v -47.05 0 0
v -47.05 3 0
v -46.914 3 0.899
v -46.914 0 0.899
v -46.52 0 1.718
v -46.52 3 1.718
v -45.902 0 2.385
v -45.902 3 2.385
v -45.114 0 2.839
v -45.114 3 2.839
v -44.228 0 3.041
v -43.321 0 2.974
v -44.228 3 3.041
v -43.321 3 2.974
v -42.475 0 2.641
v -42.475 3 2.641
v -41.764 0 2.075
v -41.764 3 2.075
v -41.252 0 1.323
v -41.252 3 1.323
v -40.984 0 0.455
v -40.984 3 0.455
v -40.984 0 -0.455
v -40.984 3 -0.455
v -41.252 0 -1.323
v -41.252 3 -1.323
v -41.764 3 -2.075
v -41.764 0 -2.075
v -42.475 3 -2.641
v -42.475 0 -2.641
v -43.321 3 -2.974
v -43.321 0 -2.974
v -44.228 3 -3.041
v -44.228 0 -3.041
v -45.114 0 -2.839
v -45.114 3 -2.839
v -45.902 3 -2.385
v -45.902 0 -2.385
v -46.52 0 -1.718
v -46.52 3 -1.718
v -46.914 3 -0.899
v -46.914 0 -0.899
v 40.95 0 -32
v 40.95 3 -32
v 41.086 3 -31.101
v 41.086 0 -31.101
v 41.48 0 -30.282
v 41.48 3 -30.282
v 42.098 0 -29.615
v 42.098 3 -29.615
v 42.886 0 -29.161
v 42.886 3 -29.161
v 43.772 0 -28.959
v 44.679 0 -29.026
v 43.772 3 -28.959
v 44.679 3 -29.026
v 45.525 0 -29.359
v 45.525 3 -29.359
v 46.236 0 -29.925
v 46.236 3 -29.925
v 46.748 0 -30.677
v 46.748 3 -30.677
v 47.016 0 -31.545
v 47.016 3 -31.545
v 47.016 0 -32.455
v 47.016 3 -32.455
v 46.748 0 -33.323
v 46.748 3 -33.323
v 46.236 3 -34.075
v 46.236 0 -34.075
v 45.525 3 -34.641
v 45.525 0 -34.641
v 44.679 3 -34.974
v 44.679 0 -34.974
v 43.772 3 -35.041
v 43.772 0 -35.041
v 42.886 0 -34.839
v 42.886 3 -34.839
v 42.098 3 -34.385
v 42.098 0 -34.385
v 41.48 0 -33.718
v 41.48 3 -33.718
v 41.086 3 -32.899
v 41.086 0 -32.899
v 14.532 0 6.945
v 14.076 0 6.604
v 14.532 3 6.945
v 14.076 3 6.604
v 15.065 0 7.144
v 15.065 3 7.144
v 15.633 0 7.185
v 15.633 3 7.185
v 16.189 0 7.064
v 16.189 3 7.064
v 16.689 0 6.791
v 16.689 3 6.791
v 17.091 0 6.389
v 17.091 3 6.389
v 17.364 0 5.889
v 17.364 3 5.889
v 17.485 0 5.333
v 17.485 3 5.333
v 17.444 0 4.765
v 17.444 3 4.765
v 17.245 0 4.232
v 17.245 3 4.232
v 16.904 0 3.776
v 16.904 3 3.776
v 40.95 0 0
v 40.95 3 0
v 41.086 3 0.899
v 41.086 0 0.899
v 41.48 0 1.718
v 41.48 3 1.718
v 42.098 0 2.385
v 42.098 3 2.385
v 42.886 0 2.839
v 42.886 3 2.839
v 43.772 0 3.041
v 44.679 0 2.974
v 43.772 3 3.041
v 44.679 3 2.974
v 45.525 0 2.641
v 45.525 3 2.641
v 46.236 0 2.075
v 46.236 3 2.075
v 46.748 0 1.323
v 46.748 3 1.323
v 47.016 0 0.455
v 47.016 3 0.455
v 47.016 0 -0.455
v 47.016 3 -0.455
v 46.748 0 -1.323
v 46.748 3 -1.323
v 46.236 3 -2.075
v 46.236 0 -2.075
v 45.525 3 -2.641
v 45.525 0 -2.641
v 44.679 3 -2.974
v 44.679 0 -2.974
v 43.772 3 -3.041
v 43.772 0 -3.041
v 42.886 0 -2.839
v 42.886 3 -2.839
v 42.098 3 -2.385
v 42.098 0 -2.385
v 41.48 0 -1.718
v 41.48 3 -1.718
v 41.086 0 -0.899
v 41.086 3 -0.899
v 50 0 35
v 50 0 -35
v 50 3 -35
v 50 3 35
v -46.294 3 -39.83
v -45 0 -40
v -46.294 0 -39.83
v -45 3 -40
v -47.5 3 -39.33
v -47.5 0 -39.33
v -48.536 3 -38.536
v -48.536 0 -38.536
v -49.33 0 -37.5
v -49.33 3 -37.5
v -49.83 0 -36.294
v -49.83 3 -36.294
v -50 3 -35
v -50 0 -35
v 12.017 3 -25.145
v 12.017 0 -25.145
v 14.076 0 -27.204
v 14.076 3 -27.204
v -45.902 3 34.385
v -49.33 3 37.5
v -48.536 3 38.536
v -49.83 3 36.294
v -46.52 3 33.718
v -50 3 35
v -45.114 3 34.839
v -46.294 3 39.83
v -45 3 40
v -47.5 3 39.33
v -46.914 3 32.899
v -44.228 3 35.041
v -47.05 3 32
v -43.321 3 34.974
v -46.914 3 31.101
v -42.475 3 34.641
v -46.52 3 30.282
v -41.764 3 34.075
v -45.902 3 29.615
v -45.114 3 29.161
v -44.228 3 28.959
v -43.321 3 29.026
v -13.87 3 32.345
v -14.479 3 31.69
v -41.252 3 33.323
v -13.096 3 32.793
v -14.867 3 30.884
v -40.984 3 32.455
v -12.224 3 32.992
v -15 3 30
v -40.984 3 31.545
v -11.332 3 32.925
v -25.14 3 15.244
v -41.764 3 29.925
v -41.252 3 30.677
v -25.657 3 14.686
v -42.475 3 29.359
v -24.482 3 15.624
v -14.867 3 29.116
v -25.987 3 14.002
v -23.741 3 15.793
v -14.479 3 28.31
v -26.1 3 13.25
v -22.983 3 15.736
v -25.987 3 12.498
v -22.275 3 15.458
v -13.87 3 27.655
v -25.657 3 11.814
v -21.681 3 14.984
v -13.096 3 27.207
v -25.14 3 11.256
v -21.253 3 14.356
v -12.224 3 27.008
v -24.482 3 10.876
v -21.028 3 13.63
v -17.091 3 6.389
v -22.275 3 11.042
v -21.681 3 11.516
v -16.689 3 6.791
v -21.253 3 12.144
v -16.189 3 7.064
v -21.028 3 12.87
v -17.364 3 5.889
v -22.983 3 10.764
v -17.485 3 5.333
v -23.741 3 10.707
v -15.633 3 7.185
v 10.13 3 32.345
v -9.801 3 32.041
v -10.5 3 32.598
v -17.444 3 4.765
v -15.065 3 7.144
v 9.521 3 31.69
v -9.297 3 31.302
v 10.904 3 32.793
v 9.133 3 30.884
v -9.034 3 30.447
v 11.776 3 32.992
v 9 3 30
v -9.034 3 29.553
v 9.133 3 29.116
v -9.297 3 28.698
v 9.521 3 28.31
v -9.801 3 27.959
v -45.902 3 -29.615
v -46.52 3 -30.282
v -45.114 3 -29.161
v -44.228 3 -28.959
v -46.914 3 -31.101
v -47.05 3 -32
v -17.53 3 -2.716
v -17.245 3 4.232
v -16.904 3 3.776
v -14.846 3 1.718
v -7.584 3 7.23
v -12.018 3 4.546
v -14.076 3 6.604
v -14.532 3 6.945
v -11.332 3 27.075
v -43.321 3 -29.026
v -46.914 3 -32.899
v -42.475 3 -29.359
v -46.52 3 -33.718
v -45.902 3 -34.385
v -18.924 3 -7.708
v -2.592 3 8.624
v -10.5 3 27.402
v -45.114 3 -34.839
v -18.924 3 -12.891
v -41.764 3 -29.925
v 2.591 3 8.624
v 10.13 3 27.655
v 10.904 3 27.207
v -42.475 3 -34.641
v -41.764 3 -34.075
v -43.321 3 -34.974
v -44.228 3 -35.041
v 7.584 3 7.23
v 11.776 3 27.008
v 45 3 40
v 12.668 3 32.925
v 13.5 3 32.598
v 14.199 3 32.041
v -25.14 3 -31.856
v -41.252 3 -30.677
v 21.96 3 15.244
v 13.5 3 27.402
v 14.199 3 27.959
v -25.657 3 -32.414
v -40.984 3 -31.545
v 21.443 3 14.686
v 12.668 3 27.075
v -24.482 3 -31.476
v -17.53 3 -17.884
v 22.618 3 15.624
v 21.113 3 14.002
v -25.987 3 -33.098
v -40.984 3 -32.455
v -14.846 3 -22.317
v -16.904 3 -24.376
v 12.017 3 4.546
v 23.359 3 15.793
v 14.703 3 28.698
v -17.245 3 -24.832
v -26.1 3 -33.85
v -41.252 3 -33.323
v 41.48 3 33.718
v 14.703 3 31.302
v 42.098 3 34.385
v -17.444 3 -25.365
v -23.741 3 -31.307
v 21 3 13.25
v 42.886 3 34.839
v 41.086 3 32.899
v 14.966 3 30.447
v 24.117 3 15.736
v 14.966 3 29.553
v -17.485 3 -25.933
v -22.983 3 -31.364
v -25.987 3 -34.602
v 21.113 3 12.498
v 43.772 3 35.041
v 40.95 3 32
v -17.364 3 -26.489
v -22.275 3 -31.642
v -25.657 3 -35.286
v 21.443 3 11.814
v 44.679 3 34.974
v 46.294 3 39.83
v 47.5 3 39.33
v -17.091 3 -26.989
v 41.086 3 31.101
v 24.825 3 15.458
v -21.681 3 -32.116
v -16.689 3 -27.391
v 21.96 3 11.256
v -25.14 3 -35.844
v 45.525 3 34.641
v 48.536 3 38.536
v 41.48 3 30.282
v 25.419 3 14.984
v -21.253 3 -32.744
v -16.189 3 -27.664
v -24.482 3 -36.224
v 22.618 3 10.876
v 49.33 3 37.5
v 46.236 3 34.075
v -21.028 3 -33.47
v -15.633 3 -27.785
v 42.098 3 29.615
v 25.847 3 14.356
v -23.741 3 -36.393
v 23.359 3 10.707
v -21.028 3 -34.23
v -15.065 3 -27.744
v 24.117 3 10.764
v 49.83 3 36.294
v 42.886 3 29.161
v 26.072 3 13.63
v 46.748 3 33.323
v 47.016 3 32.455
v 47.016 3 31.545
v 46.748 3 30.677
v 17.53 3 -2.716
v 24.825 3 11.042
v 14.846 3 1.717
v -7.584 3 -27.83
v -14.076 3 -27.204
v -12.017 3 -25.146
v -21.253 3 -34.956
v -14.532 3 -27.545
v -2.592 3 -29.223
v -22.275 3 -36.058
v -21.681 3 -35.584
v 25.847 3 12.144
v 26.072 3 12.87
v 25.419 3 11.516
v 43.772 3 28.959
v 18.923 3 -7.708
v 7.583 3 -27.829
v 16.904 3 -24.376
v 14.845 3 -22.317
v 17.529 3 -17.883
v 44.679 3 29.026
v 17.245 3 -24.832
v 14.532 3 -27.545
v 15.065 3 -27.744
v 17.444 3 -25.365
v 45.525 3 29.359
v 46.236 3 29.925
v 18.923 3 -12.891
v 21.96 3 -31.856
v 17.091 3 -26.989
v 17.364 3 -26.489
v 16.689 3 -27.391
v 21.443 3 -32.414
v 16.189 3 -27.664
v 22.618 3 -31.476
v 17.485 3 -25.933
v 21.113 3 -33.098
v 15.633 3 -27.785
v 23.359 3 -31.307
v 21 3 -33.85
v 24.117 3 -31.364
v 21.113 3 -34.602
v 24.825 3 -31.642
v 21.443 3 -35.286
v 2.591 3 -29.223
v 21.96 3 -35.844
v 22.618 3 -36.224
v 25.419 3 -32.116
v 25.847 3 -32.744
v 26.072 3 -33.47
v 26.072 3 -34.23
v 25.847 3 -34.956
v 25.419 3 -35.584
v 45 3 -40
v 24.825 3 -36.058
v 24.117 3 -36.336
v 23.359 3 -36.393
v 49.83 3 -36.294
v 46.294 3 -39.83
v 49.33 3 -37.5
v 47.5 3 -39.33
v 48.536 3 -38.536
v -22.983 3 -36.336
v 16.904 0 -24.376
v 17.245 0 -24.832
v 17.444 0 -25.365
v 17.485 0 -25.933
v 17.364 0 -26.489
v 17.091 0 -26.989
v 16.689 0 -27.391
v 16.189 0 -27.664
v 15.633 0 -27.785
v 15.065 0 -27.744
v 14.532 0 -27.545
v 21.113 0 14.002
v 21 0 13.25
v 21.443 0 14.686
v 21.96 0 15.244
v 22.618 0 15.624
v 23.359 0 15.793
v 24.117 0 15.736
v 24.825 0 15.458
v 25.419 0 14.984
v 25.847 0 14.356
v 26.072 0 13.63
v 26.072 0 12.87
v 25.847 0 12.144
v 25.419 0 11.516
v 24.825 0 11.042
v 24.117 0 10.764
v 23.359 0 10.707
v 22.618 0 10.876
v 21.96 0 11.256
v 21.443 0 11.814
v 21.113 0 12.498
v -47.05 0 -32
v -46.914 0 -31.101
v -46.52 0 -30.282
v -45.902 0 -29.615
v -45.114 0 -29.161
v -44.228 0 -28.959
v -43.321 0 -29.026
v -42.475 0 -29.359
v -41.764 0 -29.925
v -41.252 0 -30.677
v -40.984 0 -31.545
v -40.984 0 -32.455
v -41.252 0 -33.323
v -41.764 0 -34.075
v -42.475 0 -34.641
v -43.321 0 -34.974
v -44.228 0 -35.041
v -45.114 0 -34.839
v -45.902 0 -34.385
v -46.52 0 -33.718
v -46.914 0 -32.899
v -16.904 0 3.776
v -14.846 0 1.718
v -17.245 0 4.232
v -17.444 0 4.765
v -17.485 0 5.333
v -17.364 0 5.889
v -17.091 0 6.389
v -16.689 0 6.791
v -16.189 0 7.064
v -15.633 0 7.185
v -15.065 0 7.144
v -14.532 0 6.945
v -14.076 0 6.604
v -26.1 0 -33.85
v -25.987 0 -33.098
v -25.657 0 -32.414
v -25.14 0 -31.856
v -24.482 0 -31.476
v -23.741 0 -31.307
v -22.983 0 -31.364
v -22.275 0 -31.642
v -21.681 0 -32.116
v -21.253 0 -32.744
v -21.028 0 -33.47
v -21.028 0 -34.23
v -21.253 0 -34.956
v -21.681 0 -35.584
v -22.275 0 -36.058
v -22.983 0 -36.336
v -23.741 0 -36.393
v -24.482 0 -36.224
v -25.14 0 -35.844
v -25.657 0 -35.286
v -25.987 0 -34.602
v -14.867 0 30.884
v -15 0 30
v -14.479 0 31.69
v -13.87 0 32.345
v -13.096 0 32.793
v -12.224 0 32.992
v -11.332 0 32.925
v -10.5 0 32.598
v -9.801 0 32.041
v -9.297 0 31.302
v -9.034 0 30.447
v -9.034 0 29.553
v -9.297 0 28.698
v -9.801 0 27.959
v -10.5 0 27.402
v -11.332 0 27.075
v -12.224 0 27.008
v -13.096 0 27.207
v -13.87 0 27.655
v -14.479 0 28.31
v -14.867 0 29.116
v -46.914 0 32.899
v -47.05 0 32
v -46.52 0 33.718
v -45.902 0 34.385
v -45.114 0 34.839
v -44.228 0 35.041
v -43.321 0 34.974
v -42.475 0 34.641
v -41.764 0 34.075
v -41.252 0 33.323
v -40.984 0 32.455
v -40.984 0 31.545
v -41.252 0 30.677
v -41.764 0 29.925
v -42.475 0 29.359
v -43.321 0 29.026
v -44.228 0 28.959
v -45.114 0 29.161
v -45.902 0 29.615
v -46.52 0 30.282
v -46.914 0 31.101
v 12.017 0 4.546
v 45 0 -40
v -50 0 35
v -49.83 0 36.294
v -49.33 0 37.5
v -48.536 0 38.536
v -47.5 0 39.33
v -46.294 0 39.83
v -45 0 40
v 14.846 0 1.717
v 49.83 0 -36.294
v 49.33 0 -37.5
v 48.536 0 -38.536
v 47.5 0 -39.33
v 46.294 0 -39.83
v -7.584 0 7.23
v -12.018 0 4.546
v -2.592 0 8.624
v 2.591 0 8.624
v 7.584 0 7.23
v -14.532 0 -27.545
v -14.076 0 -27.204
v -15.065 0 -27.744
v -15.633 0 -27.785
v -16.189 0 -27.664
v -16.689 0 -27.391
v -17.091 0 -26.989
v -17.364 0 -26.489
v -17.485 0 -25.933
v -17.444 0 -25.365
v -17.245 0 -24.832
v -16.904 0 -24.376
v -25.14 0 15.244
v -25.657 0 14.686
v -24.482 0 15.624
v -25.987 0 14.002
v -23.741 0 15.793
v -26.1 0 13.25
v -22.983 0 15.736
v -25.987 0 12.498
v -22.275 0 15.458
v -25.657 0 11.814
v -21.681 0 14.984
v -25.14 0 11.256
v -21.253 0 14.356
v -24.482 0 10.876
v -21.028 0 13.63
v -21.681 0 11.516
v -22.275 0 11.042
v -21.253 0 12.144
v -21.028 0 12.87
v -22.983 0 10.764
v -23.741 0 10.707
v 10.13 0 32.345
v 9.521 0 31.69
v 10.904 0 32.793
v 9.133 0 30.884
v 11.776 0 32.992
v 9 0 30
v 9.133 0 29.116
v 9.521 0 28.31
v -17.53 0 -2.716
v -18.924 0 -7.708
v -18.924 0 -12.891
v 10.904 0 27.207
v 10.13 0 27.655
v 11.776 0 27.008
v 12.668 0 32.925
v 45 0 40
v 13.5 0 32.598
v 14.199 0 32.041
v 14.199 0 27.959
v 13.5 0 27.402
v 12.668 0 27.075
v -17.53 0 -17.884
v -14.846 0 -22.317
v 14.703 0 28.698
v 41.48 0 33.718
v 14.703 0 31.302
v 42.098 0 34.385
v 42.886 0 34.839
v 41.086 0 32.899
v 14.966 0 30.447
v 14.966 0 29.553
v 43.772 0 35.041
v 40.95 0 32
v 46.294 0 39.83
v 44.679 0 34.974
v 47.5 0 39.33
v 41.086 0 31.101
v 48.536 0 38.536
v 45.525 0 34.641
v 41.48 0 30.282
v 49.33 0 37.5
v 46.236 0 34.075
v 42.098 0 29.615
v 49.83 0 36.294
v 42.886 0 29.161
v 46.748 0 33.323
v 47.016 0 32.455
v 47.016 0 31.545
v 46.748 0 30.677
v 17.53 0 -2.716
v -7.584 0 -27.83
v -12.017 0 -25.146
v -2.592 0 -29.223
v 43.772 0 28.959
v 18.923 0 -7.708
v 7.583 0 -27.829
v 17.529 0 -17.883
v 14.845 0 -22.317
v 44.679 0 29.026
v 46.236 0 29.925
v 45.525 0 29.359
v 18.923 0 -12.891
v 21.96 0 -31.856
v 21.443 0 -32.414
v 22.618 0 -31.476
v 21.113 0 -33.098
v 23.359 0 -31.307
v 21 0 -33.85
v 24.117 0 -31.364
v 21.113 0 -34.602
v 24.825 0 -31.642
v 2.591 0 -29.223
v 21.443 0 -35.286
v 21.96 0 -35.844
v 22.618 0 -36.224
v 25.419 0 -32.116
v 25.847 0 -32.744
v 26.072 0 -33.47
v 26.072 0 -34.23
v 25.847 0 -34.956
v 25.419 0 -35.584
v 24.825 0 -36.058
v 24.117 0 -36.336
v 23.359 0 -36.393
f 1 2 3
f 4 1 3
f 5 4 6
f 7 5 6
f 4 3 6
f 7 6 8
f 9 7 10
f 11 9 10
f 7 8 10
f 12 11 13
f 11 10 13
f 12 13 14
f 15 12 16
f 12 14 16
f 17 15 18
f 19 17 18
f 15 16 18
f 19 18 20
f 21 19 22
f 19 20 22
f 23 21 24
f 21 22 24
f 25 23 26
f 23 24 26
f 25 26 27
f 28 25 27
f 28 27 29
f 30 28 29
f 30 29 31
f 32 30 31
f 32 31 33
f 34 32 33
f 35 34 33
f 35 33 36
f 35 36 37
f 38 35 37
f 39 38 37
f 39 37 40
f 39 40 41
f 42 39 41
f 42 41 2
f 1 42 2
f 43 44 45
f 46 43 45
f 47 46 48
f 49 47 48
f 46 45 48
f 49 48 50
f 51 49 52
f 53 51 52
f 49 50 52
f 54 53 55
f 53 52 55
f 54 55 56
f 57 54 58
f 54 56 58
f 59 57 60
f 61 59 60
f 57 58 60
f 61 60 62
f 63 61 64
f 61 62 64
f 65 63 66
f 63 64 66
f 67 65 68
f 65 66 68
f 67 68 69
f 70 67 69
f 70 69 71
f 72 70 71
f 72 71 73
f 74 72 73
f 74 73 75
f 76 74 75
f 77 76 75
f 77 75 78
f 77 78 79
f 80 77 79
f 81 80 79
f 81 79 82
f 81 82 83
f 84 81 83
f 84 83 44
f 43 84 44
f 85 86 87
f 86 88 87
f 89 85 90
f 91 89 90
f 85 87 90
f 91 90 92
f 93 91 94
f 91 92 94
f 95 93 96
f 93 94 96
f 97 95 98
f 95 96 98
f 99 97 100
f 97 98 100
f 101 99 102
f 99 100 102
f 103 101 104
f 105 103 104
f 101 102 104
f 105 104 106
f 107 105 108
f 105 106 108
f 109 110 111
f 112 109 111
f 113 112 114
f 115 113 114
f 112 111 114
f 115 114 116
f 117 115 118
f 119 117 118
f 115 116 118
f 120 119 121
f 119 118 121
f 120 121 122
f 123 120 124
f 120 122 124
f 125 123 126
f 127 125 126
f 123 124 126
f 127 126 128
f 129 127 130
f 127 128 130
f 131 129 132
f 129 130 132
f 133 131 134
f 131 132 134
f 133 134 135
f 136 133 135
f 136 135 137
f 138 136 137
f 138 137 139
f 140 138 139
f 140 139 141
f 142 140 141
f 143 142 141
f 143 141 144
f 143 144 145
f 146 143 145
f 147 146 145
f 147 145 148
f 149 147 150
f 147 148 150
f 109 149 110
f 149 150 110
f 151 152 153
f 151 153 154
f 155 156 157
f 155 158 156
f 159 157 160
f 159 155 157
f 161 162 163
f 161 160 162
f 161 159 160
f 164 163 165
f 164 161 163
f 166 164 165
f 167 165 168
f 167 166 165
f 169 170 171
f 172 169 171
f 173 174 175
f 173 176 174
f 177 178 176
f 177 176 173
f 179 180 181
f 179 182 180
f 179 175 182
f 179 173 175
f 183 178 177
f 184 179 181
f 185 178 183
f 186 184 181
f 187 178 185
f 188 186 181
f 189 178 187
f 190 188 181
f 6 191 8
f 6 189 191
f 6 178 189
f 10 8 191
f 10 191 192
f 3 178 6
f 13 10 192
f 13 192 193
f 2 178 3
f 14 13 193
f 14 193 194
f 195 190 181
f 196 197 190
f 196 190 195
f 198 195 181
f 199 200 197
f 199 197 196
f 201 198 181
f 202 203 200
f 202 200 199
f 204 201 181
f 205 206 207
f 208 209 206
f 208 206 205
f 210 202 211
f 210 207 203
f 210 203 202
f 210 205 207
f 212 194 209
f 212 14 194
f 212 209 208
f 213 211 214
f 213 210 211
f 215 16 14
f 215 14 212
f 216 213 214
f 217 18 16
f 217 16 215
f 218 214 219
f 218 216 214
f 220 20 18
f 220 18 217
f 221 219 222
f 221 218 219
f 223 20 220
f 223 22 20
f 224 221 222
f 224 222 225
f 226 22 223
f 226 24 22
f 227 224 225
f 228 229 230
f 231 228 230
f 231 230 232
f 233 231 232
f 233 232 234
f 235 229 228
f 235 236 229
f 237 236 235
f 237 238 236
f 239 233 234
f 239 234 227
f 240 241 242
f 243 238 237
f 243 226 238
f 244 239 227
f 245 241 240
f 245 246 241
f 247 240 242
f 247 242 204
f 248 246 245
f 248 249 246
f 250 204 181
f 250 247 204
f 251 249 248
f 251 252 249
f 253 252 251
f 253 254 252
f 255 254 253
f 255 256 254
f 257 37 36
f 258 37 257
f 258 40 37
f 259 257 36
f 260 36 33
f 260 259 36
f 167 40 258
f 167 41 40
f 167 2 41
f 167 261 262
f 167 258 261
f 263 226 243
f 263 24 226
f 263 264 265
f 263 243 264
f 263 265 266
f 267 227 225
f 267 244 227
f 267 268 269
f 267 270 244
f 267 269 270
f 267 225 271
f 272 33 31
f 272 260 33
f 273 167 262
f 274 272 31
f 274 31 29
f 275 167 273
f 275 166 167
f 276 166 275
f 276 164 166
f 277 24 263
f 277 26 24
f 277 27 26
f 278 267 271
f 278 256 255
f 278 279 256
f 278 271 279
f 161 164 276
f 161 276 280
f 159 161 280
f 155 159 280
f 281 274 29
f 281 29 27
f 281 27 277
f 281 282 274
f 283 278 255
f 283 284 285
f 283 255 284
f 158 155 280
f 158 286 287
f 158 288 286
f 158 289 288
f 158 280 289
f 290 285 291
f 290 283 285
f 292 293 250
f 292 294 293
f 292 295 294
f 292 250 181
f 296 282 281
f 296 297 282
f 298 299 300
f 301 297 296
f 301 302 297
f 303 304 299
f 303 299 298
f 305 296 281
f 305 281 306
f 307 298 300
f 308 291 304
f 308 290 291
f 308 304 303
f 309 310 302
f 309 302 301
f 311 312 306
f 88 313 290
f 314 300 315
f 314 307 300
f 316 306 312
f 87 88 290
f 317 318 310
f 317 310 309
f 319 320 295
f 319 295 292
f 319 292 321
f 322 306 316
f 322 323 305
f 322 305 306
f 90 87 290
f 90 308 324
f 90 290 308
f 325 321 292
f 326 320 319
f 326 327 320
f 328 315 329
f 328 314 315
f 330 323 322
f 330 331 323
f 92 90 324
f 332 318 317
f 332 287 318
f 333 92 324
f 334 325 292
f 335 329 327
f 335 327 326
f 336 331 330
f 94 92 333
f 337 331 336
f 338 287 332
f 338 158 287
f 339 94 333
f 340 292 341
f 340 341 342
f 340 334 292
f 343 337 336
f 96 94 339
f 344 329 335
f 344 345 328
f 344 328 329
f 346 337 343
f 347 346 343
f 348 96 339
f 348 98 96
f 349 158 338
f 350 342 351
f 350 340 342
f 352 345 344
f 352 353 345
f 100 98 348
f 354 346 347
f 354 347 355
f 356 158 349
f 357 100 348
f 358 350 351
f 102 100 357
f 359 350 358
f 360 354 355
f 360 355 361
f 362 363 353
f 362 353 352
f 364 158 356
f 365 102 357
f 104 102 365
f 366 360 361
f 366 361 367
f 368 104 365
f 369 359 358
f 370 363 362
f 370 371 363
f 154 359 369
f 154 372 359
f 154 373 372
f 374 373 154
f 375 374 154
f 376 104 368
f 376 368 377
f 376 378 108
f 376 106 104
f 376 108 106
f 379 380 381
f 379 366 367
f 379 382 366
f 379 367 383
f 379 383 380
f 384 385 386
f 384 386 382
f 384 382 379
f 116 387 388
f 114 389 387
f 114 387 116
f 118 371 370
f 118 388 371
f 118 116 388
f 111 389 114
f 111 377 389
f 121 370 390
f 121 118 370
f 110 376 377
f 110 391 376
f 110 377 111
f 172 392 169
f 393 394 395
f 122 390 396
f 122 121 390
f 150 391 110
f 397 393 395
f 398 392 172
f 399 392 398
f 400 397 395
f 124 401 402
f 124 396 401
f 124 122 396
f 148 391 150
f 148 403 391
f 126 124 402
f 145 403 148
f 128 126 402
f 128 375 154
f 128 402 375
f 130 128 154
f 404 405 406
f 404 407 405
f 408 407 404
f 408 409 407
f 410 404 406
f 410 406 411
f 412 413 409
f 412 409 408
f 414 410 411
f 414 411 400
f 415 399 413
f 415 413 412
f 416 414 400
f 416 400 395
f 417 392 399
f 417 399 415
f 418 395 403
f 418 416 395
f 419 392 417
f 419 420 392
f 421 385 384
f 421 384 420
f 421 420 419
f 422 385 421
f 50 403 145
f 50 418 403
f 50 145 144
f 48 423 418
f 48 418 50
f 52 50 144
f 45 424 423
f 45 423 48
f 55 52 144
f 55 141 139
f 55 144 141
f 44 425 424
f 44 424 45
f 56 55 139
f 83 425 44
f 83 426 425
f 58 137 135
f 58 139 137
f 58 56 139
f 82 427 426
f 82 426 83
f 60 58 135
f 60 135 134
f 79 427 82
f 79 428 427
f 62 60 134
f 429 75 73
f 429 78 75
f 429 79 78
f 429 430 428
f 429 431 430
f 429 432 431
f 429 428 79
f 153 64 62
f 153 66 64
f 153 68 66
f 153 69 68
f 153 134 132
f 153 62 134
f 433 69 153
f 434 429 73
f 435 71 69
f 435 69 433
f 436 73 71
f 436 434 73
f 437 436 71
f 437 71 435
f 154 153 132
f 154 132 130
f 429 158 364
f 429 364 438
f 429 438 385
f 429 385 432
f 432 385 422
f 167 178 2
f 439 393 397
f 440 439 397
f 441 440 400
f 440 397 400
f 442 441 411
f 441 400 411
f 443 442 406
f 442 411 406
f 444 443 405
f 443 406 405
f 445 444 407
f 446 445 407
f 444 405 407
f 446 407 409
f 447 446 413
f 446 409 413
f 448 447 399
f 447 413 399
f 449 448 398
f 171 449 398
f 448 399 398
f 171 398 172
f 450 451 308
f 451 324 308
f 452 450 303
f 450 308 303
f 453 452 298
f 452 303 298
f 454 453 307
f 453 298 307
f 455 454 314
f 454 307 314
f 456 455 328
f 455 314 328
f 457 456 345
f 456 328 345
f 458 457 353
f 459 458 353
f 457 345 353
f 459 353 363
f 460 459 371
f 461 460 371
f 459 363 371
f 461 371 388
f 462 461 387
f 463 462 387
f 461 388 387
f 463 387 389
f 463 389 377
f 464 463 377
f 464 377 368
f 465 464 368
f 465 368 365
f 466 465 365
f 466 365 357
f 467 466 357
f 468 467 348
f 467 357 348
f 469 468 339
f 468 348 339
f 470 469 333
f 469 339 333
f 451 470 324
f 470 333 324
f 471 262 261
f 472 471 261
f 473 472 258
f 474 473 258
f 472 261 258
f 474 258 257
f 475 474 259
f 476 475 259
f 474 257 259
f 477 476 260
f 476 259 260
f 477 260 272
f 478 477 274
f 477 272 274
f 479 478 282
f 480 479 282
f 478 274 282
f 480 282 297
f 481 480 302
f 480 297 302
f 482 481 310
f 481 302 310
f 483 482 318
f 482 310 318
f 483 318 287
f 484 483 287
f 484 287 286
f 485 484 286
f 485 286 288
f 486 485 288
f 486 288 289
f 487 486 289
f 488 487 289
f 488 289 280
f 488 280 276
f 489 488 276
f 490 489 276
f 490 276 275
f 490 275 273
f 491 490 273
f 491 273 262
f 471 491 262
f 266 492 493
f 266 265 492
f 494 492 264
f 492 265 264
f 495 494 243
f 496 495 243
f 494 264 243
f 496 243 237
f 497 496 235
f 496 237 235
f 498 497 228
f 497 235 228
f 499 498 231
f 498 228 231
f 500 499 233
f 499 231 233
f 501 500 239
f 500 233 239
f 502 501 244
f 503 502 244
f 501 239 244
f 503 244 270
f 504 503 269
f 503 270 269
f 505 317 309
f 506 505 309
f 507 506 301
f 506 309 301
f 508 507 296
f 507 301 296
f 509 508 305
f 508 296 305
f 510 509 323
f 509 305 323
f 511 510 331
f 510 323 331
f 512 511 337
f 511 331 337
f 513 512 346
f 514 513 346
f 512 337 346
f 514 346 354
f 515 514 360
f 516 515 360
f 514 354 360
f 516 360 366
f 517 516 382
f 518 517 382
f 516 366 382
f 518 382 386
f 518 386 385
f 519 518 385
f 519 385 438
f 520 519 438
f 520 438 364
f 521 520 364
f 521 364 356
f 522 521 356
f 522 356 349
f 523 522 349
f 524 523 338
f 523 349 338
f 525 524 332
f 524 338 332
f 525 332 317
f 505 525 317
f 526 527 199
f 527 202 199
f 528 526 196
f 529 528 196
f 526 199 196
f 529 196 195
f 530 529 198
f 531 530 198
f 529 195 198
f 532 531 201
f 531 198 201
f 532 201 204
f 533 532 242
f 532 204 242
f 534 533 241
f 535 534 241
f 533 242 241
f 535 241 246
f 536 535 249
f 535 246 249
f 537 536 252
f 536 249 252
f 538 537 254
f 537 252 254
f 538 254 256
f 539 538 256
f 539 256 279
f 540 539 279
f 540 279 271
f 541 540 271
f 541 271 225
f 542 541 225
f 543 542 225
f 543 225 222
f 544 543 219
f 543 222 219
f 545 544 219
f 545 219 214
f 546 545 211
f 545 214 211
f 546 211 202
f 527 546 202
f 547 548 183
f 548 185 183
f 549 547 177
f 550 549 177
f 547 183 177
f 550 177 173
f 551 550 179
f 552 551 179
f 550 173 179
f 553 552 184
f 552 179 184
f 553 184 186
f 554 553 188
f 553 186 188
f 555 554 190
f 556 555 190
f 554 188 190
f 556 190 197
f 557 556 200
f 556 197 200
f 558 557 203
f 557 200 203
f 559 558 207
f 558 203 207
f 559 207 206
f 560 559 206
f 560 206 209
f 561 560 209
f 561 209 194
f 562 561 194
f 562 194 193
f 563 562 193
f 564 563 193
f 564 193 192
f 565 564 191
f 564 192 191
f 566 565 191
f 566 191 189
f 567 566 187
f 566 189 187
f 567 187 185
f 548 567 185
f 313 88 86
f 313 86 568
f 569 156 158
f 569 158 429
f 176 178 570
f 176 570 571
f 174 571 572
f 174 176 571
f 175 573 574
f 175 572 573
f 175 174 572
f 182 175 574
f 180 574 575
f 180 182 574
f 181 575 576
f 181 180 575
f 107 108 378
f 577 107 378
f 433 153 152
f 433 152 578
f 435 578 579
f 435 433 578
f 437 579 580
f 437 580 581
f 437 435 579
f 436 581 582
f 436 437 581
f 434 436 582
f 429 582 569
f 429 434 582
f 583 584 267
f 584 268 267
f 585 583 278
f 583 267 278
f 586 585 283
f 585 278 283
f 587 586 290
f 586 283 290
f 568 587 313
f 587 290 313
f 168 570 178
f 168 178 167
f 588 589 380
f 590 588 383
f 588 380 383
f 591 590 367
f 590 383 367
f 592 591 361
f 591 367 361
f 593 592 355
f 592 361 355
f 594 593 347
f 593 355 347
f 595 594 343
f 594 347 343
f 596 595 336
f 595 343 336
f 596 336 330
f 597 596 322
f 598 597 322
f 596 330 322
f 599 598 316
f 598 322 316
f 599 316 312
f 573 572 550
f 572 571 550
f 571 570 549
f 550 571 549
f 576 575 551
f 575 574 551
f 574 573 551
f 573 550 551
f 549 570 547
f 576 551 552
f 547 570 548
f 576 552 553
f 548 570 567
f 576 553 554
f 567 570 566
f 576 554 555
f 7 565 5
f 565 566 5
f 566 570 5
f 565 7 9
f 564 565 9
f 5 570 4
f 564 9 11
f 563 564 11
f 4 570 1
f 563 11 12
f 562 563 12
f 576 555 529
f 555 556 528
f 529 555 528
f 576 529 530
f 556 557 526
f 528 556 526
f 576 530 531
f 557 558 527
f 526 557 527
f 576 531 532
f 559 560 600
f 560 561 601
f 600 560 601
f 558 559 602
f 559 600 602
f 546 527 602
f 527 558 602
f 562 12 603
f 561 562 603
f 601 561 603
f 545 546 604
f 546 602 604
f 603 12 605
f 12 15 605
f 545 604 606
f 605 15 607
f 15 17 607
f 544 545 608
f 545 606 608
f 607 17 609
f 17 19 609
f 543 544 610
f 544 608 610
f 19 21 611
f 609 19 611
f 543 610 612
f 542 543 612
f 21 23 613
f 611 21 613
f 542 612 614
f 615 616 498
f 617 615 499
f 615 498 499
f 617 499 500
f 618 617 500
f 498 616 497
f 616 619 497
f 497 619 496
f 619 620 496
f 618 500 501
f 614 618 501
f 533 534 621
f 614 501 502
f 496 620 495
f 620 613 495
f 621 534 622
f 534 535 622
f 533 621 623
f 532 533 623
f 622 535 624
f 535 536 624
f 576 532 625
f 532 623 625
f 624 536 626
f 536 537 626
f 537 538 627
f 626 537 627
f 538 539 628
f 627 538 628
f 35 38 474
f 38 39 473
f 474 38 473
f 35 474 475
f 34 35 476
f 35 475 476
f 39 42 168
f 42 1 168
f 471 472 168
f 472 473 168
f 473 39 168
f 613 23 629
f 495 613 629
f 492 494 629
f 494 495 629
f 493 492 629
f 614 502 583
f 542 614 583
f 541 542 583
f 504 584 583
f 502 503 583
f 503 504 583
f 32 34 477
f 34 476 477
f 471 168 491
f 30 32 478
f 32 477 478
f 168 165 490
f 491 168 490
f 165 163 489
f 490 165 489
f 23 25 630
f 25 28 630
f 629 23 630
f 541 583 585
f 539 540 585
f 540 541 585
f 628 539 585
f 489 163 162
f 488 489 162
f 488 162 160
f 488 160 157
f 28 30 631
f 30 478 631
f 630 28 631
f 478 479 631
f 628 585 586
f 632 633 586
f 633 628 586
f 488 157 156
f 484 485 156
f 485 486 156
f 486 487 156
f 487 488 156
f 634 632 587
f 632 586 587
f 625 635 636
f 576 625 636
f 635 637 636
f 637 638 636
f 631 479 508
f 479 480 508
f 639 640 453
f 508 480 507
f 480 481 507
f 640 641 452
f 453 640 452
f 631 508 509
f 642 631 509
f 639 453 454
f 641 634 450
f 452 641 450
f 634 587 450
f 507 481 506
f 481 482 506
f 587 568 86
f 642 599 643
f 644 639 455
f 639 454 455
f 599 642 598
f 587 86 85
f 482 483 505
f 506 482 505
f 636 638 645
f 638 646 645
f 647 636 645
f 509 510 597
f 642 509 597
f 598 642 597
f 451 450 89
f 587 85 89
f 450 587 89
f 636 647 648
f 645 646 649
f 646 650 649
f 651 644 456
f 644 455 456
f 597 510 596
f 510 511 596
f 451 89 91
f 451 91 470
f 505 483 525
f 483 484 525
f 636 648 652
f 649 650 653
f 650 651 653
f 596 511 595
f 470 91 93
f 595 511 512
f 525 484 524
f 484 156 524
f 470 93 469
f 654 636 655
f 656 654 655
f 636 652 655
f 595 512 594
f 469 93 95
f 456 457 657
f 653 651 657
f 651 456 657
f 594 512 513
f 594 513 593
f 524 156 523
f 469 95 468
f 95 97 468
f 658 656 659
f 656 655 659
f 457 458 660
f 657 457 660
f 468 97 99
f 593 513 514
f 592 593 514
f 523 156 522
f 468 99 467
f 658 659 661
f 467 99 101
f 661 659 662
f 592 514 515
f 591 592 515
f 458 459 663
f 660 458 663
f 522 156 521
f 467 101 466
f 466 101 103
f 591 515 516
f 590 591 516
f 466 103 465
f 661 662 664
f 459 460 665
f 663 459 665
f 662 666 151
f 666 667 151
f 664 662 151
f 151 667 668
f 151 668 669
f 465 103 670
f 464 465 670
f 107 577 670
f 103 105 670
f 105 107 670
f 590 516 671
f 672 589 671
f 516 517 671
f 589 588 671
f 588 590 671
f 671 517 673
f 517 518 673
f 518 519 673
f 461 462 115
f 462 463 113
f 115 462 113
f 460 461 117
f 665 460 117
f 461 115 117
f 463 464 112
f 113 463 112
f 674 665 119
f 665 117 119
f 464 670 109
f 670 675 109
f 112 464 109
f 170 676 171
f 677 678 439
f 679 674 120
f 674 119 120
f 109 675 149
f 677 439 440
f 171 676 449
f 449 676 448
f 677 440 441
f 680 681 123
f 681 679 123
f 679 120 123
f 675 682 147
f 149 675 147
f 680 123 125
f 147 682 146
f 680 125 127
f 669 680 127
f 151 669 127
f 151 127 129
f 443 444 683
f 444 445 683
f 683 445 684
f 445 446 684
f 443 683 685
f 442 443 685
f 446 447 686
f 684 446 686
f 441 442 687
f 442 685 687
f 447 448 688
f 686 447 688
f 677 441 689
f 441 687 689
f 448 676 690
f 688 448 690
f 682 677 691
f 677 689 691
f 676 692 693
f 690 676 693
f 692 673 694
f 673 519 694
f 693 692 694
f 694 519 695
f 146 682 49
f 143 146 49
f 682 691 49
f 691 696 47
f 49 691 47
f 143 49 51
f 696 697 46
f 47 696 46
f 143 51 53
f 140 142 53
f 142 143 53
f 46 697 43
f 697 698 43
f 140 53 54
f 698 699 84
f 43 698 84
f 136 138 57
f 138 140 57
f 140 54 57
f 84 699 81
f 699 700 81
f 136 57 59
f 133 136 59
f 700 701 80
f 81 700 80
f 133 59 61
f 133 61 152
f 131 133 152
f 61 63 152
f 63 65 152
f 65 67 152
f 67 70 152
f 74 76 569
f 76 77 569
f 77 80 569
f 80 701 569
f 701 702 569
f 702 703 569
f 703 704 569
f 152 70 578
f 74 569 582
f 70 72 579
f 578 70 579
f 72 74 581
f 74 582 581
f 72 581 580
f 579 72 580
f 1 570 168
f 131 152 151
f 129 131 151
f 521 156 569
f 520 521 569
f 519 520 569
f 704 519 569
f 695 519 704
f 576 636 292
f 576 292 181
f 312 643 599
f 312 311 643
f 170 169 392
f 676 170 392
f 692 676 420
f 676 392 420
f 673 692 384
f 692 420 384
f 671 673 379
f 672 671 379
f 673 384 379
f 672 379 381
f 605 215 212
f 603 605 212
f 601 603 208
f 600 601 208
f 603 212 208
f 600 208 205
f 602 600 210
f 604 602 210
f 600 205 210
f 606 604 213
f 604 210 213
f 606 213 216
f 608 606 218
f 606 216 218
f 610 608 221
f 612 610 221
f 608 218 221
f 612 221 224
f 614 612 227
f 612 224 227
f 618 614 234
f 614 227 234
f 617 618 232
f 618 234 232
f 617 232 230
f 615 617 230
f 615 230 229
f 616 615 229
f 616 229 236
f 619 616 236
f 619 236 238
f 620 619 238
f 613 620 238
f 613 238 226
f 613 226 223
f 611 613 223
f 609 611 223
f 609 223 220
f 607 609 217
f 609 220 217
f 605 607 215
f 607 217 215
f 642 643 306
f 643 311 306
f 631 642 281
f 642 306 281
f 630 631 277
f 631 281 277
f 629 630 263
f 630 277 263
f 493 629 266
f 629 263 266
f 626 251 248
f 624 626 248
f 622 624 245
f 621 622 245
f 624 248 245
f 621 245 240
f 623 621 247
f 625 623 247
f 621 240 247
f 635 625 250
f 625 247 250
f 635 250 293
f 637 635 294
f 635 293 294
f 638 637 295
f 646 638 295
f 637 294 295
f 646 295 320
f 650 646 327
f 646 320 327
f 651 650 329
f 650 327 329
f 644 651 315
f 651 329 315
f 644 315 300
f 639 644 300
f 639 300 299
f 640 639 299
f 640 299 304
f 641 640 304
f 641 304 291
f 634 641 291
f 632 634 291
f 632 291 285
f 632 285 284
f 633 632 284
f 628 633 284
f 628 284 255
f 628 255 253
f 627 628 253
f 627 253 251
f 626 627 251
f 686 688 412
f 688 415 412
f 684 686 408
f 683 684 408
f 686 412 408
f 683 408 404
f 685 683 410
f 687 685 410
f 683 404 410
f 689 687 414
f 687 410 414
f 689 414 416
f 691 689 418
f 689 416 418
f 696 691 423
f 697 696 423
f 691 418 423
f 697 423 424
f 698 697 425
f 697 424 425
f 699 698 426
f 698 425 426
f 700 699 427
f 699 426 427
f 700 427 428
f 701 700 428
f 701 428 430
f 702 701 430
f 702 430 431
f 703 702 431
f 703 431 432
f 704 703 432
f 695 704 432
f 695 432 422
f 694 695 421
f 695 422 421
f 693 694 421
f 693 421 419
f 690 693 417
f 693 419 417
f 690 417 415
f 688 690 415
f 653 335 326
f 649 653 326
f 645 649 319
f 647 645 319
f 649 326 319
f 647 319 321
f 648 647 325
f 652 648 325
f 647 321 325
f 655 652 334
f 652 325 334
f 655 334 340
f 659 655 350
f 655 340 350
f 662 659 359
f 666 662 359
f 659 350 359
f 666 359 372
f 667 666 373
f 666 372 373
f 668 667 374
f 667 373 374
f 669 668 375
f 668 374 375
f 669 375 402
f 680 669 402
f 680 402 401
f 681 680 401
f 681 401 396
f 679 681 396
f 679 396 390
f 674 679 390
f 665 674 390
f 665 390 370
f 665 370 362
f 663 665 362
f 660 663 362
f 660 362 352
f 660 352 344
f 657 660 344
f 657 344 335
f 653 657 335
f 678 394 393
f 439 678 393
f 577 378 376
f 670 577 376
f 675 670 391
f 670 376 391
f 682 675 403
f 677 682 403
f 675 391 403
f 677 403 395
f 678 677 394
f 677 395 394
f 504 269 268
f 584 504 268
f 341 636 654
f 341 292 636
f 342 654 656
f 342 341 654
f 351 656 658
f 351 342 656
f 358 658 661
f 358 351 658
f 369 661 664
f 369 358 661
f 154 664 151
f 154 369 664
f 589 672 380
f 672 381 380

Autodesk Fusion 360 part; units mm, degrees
sketch "Dimension" plane through (0, 0, 0) normal (0, 1, 0) x (1, 0, 0)
  line L0 (50, -40) -> (-50, -40)
  line L1 (-50, -40) -> (-50, 40)
  line L2 (-50, 40) -> (50, 40)
  line L3 (50, 40) -> (50, -40)
  line L4 (50, -40) -> (-50, 40) construction
  line L5 (-50, -40) -> (50, 40) construction
  dimension "d4" = 100
  dimension "d5" = 80
extrude "Extrude1" add sketch "Dimension" along normal blind 3
sketch "Stepper Mount" plane through (0, 3, 0) normal (0, 1, 0) x (-1, 0, 0)
  line L0 (-50, -40) -> (50, -40)
  line L1 (50, -40) -> (50, 40)
  line L2 (50, 40) -> (-50, 40)
  line L3 (-50, 40) -> (-50, -40)
  line L4 (30, -40) -> (-30, -40)
  line L5 (-30, -40) -> (-30, 40) construction
  line L6 (-30, 40) -> (30, 40)
  line L7 (30, 40) -> (30, -40) construction
  circle A0 centre (23.55, -33.85) radius 2.55
  circle A1 centre (-23.55, -33.85) radius 2.55
  circle A2 centre (23.55, 13.25) radius 2.55
  circle A3 centre (-23.55, 13.25) radius 2.55
  line L8 (-23.55, 13.25) -> (23.55, -33.85)
  circle A4 centre (15.49, -25.79) radius 2
  line L9 (0, -10.3) -> (-30, -10.3) construction
  line L10 (0, -10.3) -> (0, -40) construction
  circle A5 centre (-15.49, -25.79) radius 2
  line L11 (15.49, -25.79) -> (-15.49, 5.19)
  line L12 (-15.49, 5.19) -> (-16.9042, 3.7758) construction
  line L13 (-16.9042, 3.7758) -> (14.0758, -27.2042)
  line L14 (14.0758, -27.2042) -> (15.49, -25.79)
  line L15 (15.49, -25.79) -> (-15.49, 5.19)
  line L16 (-15.49, 5.19) -> (-14.0758, 6.6042) construction
  line L17 (-14.0758, 6.6042) -> (16.9042, -24.3758)
  line L18 (16.9042, -24.3758) -> (15.49, -25.79)
  line L19 (14.0758, 6.6042) -> (-16.9042, -24.3758)
  line L20 (16.9042, 3.7758) -> (-14.0758, -27.2042)
  line L21 (23.55, 13.25) -> (13.5057, 3.2057) construction
  line L22 (1.4142, -8.8858) -> (-23.55, -33.85) construction
  arc A6 (16.9042, 3.7758) -> (14.0758, 6.6042) centre (15.49, 5.19) ccw
  arc A7 (-14.0758, 6.6042) -> (-16.9042, 3.7758) centre (-15.49, 5.19) ccw
  arc A8 (-13.5057, 3.2057) -> (-12.0173, 4.5457) centre (0, -10.3) ccw
  dimension "d8" = 60
  dimension "d9" = 38.2
  dimension "d10" = 30
  dimension "d11" = 29.7
  dimension "d12" = 5.1
  dimension "d13" = 6.45
  dimension "d14" = 6.15
  dimension "d15" = 5.1
  dimension "d16" = 6.15
  dimension "d17" = 53.55
  dimension "d18" = 5.1
  dimension "d19" = 6.45
  dimension "d20" = 53.25
  dimension "d21" = 5.1
  dimension "d22" = 53.25
  dimension "d23" = 53.55
  dimension "d24" = 14.51
  dimension "d25" = 14.21
  dimension "d26" = 4
  dimension "d27" = 2
  dimension "d28" = 2
extrude "Extrude2" cut sketch "Stepper Mount" against normal through all contours A0 | A3 | L8 A4 L14 | L8 A4 L18 | L8 A4 L11 L14 L15 | L8 A4 L11 L15 L18 | L8 A4 L11 L13 L15 A8 | L8 A4 L11 L15 L17 A8 | L13 L20 A8 | L8 L11 L13 L15 L20 A8 | L8 L11 L15 L17 L20 A8 | L17 L20 A8 | L13 L19 L20 A8 | L8 L11 L13 L15 L19 L20 | A5 L19 L20 A8 | L8 L11 L15 L17 L19 L20 | L17 L19 L20 A8 | L19 L20 A6 A8 | L13 L19 A8 | L8 L11 L13 L15 L19 A8 | A5 | L8 L11 L15 L17 L19 A7 | L17 L19 A8 | L8 L11 L13 L15 A7 A8 | A1 | A2
sketch "Idler Mount" plane through (0, 3, 0) normal (0, 1, 0) x (-1, 0, 0)
  circle A0 centre (23.55, 13.25) radius 2.55
  circle A1 centre (23.55, -33.85) radius 2.55
  line L0 (14.8457, -22.3173) -> (16.9042, -24.3758)
  arc A2 (14.0758, -27.2042) -> (16.9042, -24.3758) centre (15.49, -25.79) ccw
  line L1 (14.0758, -27.2042) -> (12.0173, -25.1457)
  arc A3 (-12.0173, -25.1457) -> (12.0173, -25.1457) centre (0, -10.3) ccw
  line L2 (-12.0173, -25.1457) -> (-14.0758, -27.2042)
  arc A4 (-16.9042, -24.3758) -> (-14.0758, -27.2042) centre (-15.49, -25.79) ccw
  line L3 (-16.9042, -24.3758) -> (-14.8457, -22.3173)
  arc A5 (-14.8457, 1.7173) -> (-14.8457, -22.3173) centre (0, -10.3) ccw
  line L4 (-14.8457, 1.7173) -> (-16.9042, 3.7758)
  arc A6 (-14.0758, 6.6042) -> (-16.9042, 3.7758) centre (-15.49, 5.19) ccw
  line L5 (-14.0758, 6.6042) -> (-12.0173, 4.5457)
  arc A7 (12.0173, 4.5457) -> (-12.0173, 4.5457) centre (0, -10.3) ccw
  line L6 (12.0173, 4.5457) -> (14.0758, 6.6042)
  arc A8 (16.9042, 3.7758) -> (14.0758, 6.6042) centre (15.49, 5.19) ccw
  line L7 (16.9042, 3.7758) -> (14.8457, 1.7173)
  arc A9 (14.8457, -22.3173) -> (14.8457, 1.7173) centre (0, -10.3) ccw
  circle A10 centre (-23.55, 13.25) radius 2.55
  circle A11 centre (-23.55, -33.85) radius 2.55
  line L8 (-50, -40) -> (50, -40)
  line L9 (50, -40) -> (50, 40)
  line L10 (50, 40) -> (-50, 40)
  line L11 (-50, 40) -> (-50, -40)
  arc A12 (-14.8457, 1.7173) -> (-14.8457, -22.3173) centre (0, -10.3) ccw
  arc A13 (-12.0173, -25.1457) -> (12.0173, -25.1457) centre (0, -10.3) ccw
  arc A14 (14.8457, -22.3173) -> (14.8457, 1.7173) centre (0, -10.3) ccw
  arc A15 (12.0173, 4.5457) -> (-12.0173, 4.5457) centre (0, -10.3) ccw
  circle A16 centre (0, -10.3) radius 6 construction
  line L12 (0, -10.3) -> (50, -10.3) construction
  line L13 (0, -10.3) -> (-50, -10.3) construction
  circle A17 centre (0, -10.3) radius 9
  line L14 (6, -10.3) -> (-6, -10.3)
  line L15 (-6, -10.3) -> (-6, 40) construction
  line L16 (-6, 40) -> (6, 40)
  line L17 (6, 40) -> (6, -10.3) construction
  line L18 (50, 30) -> (-50, 30) construction
  line L19 (-50, 30) -> (-50, 40)
  line L20 (-50, 40) -> (50, 40)
  line L21 (50, 40) -> (50, 30)
  circle A18 centre (12, 30) radius 6 construction
  circle A19 centre (12, 30) radius 9 construction
  circle A20 centre (12, 30) radius 3
  line L22 (0, 20) -> (0, 2.5)
  circle A21 centre (-12, 30) radius 9 construction
  circle A22 centre (-12, 30) radius 6 construction
  circle A23 centre (-12, 30) radius 3
  dimension "d30" = 12
  dimension "d31" = 18
  dimension "d33" = 10
  dimension "d38" = 12
  dimension "d39" = 18
  dimension "d41" = 6
extrude "Extrude3" cut sketch "Idler Mount" against normal through all contours A20 | A23
sketch "Bracket Mount" plane through (0, 3, 0) normal (0, 1, 0) x (-1, 0, 0)
  circle A0 centre (12, 30) radius 3
  circle A1 centre (-12, 30) radius 3
  circle A2 centre (23.55, 13.25) radius 2.55
  circle A3 centre (23.55, -33.85) radius 2.55
  line L0 (14.8457, -22.3173) -> (16.9042, -24.3758)
  arc A4 (14.0758, -27.2042) -> (16.9042, -24.3758) centre (15.49, -25.79) ccw
  line L1 (14.0758, -27.2042) -> (12.0173, -25.1457)
  arc A5 (-12.0173, -25.1457) -> (12.0173, -25.1457) centre (0, -10.3) ccw
  line L2 (-12.0173, -25.1457) -> (-14.0758, -27.2042)
  arc A6 (-16.9042, -24.3758) -> (-14.0758, -27.2042) centre (-15.49, -25.79) ccw
  line L3 (-16.9042, -24.3758) -> (-14.8457, -22.3173)
  arc A7 (-14.8457, 1.7173) -> (-14.8457, -22.3173) centre (0, -10.3) ccw
  line L4 (-14.8457, 1.7173) -> (-16.9042, 3.7758)
  arc A8 (-14.0758, 6.6042) -> (-16.9042, 3.7758) centre (-15.49, 5.19) ccw
  line L5 (-14.0758, 6.6042) -> (-12.0173, 4.5457)
  arc A9 (12.0173, 4.5457) -> (-12.0173, 4.5457) centre (0, -10.3) ccw
  line L6 (12.0173, 4.5457) -> (14.0758, 6.6042)
  arc A10 (16.9042, 3.7758) -> (14.0758, 6.6042) centre (15.49, 5.19) ccw
  line L7 (16.9042, 3.7758) -> (14.8457, 1.7173)
  arc A11 (14.8457, -22.3173) -> (14.8457, 1.7173) centre (0, -10.3) ccw
  circle A12 centre (-23.55, 13.25) radius 2.55
  circle A13 centre (-23.55, -33.85) radius 2.55
  line L8 (-50, -40) -> (50, -40)
  line L9 (50, -40) -> (50, 40)
  line L10 (50, 40) -> (-50, 40)
  line L11 (-50, 40) -> (-50, -40)
  circle A14 centre (44, -32) radius 3.05
  line L12 (0, 20) -> (0, 2.5)
  circle A15 centre (-44, -32) radius 3.05
  line L13 (-2.5, 0) -> (-20, 0)
  circle A16 centre (44, 32) radius 3.05
  circle A17 centre (-44, 32) radius 3.05
  line L14 (-44, 32) -> (-44, -32) construction
  line L15 (44, -32) -> (44, 32) construction
  circle A18 centre (44, 0) radius 3.05
  circle A19 centre (-44, 0) radius 3.05
  dimension "d45" = 6.1
  dimension "d46" = 8
  dimension "d47" = 6
  dimension "d53" = 6.1
extrude "Extrude4" cut sketch "Bracket Mount" against normal through all contours A14 | A15 | A16 | A17 | A18 | A19
fillet "Fillet1" radius 5 4 edges at (50, 1.5, -40) (-50, 1.5, -40) (-50, 1.5, 40) (50, 1.5, 40)
equation "PlateWidth = 100 mm"
equation "PlateHeight = 80 mm"
equation "PlateThickness = 3 mm"
equation "d4 = PlateWidth"
equation "d5 = PlateHeight"
equation "d6 = PlateThickness"
equation "IdlerToBaseDistance = 10 mm"
equation "d33 = IdlerToBaseDistance"
equation "IdlerInternalDiameter = 12 mm"
equation "IdlerOuterDiameter = 18 mm"
equation "DriverInnerDiameter = 12 mm"
equation "DriverOuterDiameter = 18 mm"
equation "d38 = IdlerInternalDiameter"
equation "d39 = IdlerOuterDiameter"
equation "IdlerBoreDiameter = 6 mm"
equation "d41 = IdlerBoreDiameter"
equation "BracketMountHoleDiameter = 6.1 mm"
equation "BracketMountHoleHDistance = 6 mm"
equation "d45 = BracketMountHoleDiameter"
equation "d46 = BracketMountHoleVDistance"
equation "d47 = BracketMountHoleHDistance"
equation "BracketFilletRadius = 5 mm"
equation "d51 = BracketFilletRadius"
equation "BracketMountHoleVDistance = 8 mm"
equation "d53 = BracketMountHoleDiameter"
